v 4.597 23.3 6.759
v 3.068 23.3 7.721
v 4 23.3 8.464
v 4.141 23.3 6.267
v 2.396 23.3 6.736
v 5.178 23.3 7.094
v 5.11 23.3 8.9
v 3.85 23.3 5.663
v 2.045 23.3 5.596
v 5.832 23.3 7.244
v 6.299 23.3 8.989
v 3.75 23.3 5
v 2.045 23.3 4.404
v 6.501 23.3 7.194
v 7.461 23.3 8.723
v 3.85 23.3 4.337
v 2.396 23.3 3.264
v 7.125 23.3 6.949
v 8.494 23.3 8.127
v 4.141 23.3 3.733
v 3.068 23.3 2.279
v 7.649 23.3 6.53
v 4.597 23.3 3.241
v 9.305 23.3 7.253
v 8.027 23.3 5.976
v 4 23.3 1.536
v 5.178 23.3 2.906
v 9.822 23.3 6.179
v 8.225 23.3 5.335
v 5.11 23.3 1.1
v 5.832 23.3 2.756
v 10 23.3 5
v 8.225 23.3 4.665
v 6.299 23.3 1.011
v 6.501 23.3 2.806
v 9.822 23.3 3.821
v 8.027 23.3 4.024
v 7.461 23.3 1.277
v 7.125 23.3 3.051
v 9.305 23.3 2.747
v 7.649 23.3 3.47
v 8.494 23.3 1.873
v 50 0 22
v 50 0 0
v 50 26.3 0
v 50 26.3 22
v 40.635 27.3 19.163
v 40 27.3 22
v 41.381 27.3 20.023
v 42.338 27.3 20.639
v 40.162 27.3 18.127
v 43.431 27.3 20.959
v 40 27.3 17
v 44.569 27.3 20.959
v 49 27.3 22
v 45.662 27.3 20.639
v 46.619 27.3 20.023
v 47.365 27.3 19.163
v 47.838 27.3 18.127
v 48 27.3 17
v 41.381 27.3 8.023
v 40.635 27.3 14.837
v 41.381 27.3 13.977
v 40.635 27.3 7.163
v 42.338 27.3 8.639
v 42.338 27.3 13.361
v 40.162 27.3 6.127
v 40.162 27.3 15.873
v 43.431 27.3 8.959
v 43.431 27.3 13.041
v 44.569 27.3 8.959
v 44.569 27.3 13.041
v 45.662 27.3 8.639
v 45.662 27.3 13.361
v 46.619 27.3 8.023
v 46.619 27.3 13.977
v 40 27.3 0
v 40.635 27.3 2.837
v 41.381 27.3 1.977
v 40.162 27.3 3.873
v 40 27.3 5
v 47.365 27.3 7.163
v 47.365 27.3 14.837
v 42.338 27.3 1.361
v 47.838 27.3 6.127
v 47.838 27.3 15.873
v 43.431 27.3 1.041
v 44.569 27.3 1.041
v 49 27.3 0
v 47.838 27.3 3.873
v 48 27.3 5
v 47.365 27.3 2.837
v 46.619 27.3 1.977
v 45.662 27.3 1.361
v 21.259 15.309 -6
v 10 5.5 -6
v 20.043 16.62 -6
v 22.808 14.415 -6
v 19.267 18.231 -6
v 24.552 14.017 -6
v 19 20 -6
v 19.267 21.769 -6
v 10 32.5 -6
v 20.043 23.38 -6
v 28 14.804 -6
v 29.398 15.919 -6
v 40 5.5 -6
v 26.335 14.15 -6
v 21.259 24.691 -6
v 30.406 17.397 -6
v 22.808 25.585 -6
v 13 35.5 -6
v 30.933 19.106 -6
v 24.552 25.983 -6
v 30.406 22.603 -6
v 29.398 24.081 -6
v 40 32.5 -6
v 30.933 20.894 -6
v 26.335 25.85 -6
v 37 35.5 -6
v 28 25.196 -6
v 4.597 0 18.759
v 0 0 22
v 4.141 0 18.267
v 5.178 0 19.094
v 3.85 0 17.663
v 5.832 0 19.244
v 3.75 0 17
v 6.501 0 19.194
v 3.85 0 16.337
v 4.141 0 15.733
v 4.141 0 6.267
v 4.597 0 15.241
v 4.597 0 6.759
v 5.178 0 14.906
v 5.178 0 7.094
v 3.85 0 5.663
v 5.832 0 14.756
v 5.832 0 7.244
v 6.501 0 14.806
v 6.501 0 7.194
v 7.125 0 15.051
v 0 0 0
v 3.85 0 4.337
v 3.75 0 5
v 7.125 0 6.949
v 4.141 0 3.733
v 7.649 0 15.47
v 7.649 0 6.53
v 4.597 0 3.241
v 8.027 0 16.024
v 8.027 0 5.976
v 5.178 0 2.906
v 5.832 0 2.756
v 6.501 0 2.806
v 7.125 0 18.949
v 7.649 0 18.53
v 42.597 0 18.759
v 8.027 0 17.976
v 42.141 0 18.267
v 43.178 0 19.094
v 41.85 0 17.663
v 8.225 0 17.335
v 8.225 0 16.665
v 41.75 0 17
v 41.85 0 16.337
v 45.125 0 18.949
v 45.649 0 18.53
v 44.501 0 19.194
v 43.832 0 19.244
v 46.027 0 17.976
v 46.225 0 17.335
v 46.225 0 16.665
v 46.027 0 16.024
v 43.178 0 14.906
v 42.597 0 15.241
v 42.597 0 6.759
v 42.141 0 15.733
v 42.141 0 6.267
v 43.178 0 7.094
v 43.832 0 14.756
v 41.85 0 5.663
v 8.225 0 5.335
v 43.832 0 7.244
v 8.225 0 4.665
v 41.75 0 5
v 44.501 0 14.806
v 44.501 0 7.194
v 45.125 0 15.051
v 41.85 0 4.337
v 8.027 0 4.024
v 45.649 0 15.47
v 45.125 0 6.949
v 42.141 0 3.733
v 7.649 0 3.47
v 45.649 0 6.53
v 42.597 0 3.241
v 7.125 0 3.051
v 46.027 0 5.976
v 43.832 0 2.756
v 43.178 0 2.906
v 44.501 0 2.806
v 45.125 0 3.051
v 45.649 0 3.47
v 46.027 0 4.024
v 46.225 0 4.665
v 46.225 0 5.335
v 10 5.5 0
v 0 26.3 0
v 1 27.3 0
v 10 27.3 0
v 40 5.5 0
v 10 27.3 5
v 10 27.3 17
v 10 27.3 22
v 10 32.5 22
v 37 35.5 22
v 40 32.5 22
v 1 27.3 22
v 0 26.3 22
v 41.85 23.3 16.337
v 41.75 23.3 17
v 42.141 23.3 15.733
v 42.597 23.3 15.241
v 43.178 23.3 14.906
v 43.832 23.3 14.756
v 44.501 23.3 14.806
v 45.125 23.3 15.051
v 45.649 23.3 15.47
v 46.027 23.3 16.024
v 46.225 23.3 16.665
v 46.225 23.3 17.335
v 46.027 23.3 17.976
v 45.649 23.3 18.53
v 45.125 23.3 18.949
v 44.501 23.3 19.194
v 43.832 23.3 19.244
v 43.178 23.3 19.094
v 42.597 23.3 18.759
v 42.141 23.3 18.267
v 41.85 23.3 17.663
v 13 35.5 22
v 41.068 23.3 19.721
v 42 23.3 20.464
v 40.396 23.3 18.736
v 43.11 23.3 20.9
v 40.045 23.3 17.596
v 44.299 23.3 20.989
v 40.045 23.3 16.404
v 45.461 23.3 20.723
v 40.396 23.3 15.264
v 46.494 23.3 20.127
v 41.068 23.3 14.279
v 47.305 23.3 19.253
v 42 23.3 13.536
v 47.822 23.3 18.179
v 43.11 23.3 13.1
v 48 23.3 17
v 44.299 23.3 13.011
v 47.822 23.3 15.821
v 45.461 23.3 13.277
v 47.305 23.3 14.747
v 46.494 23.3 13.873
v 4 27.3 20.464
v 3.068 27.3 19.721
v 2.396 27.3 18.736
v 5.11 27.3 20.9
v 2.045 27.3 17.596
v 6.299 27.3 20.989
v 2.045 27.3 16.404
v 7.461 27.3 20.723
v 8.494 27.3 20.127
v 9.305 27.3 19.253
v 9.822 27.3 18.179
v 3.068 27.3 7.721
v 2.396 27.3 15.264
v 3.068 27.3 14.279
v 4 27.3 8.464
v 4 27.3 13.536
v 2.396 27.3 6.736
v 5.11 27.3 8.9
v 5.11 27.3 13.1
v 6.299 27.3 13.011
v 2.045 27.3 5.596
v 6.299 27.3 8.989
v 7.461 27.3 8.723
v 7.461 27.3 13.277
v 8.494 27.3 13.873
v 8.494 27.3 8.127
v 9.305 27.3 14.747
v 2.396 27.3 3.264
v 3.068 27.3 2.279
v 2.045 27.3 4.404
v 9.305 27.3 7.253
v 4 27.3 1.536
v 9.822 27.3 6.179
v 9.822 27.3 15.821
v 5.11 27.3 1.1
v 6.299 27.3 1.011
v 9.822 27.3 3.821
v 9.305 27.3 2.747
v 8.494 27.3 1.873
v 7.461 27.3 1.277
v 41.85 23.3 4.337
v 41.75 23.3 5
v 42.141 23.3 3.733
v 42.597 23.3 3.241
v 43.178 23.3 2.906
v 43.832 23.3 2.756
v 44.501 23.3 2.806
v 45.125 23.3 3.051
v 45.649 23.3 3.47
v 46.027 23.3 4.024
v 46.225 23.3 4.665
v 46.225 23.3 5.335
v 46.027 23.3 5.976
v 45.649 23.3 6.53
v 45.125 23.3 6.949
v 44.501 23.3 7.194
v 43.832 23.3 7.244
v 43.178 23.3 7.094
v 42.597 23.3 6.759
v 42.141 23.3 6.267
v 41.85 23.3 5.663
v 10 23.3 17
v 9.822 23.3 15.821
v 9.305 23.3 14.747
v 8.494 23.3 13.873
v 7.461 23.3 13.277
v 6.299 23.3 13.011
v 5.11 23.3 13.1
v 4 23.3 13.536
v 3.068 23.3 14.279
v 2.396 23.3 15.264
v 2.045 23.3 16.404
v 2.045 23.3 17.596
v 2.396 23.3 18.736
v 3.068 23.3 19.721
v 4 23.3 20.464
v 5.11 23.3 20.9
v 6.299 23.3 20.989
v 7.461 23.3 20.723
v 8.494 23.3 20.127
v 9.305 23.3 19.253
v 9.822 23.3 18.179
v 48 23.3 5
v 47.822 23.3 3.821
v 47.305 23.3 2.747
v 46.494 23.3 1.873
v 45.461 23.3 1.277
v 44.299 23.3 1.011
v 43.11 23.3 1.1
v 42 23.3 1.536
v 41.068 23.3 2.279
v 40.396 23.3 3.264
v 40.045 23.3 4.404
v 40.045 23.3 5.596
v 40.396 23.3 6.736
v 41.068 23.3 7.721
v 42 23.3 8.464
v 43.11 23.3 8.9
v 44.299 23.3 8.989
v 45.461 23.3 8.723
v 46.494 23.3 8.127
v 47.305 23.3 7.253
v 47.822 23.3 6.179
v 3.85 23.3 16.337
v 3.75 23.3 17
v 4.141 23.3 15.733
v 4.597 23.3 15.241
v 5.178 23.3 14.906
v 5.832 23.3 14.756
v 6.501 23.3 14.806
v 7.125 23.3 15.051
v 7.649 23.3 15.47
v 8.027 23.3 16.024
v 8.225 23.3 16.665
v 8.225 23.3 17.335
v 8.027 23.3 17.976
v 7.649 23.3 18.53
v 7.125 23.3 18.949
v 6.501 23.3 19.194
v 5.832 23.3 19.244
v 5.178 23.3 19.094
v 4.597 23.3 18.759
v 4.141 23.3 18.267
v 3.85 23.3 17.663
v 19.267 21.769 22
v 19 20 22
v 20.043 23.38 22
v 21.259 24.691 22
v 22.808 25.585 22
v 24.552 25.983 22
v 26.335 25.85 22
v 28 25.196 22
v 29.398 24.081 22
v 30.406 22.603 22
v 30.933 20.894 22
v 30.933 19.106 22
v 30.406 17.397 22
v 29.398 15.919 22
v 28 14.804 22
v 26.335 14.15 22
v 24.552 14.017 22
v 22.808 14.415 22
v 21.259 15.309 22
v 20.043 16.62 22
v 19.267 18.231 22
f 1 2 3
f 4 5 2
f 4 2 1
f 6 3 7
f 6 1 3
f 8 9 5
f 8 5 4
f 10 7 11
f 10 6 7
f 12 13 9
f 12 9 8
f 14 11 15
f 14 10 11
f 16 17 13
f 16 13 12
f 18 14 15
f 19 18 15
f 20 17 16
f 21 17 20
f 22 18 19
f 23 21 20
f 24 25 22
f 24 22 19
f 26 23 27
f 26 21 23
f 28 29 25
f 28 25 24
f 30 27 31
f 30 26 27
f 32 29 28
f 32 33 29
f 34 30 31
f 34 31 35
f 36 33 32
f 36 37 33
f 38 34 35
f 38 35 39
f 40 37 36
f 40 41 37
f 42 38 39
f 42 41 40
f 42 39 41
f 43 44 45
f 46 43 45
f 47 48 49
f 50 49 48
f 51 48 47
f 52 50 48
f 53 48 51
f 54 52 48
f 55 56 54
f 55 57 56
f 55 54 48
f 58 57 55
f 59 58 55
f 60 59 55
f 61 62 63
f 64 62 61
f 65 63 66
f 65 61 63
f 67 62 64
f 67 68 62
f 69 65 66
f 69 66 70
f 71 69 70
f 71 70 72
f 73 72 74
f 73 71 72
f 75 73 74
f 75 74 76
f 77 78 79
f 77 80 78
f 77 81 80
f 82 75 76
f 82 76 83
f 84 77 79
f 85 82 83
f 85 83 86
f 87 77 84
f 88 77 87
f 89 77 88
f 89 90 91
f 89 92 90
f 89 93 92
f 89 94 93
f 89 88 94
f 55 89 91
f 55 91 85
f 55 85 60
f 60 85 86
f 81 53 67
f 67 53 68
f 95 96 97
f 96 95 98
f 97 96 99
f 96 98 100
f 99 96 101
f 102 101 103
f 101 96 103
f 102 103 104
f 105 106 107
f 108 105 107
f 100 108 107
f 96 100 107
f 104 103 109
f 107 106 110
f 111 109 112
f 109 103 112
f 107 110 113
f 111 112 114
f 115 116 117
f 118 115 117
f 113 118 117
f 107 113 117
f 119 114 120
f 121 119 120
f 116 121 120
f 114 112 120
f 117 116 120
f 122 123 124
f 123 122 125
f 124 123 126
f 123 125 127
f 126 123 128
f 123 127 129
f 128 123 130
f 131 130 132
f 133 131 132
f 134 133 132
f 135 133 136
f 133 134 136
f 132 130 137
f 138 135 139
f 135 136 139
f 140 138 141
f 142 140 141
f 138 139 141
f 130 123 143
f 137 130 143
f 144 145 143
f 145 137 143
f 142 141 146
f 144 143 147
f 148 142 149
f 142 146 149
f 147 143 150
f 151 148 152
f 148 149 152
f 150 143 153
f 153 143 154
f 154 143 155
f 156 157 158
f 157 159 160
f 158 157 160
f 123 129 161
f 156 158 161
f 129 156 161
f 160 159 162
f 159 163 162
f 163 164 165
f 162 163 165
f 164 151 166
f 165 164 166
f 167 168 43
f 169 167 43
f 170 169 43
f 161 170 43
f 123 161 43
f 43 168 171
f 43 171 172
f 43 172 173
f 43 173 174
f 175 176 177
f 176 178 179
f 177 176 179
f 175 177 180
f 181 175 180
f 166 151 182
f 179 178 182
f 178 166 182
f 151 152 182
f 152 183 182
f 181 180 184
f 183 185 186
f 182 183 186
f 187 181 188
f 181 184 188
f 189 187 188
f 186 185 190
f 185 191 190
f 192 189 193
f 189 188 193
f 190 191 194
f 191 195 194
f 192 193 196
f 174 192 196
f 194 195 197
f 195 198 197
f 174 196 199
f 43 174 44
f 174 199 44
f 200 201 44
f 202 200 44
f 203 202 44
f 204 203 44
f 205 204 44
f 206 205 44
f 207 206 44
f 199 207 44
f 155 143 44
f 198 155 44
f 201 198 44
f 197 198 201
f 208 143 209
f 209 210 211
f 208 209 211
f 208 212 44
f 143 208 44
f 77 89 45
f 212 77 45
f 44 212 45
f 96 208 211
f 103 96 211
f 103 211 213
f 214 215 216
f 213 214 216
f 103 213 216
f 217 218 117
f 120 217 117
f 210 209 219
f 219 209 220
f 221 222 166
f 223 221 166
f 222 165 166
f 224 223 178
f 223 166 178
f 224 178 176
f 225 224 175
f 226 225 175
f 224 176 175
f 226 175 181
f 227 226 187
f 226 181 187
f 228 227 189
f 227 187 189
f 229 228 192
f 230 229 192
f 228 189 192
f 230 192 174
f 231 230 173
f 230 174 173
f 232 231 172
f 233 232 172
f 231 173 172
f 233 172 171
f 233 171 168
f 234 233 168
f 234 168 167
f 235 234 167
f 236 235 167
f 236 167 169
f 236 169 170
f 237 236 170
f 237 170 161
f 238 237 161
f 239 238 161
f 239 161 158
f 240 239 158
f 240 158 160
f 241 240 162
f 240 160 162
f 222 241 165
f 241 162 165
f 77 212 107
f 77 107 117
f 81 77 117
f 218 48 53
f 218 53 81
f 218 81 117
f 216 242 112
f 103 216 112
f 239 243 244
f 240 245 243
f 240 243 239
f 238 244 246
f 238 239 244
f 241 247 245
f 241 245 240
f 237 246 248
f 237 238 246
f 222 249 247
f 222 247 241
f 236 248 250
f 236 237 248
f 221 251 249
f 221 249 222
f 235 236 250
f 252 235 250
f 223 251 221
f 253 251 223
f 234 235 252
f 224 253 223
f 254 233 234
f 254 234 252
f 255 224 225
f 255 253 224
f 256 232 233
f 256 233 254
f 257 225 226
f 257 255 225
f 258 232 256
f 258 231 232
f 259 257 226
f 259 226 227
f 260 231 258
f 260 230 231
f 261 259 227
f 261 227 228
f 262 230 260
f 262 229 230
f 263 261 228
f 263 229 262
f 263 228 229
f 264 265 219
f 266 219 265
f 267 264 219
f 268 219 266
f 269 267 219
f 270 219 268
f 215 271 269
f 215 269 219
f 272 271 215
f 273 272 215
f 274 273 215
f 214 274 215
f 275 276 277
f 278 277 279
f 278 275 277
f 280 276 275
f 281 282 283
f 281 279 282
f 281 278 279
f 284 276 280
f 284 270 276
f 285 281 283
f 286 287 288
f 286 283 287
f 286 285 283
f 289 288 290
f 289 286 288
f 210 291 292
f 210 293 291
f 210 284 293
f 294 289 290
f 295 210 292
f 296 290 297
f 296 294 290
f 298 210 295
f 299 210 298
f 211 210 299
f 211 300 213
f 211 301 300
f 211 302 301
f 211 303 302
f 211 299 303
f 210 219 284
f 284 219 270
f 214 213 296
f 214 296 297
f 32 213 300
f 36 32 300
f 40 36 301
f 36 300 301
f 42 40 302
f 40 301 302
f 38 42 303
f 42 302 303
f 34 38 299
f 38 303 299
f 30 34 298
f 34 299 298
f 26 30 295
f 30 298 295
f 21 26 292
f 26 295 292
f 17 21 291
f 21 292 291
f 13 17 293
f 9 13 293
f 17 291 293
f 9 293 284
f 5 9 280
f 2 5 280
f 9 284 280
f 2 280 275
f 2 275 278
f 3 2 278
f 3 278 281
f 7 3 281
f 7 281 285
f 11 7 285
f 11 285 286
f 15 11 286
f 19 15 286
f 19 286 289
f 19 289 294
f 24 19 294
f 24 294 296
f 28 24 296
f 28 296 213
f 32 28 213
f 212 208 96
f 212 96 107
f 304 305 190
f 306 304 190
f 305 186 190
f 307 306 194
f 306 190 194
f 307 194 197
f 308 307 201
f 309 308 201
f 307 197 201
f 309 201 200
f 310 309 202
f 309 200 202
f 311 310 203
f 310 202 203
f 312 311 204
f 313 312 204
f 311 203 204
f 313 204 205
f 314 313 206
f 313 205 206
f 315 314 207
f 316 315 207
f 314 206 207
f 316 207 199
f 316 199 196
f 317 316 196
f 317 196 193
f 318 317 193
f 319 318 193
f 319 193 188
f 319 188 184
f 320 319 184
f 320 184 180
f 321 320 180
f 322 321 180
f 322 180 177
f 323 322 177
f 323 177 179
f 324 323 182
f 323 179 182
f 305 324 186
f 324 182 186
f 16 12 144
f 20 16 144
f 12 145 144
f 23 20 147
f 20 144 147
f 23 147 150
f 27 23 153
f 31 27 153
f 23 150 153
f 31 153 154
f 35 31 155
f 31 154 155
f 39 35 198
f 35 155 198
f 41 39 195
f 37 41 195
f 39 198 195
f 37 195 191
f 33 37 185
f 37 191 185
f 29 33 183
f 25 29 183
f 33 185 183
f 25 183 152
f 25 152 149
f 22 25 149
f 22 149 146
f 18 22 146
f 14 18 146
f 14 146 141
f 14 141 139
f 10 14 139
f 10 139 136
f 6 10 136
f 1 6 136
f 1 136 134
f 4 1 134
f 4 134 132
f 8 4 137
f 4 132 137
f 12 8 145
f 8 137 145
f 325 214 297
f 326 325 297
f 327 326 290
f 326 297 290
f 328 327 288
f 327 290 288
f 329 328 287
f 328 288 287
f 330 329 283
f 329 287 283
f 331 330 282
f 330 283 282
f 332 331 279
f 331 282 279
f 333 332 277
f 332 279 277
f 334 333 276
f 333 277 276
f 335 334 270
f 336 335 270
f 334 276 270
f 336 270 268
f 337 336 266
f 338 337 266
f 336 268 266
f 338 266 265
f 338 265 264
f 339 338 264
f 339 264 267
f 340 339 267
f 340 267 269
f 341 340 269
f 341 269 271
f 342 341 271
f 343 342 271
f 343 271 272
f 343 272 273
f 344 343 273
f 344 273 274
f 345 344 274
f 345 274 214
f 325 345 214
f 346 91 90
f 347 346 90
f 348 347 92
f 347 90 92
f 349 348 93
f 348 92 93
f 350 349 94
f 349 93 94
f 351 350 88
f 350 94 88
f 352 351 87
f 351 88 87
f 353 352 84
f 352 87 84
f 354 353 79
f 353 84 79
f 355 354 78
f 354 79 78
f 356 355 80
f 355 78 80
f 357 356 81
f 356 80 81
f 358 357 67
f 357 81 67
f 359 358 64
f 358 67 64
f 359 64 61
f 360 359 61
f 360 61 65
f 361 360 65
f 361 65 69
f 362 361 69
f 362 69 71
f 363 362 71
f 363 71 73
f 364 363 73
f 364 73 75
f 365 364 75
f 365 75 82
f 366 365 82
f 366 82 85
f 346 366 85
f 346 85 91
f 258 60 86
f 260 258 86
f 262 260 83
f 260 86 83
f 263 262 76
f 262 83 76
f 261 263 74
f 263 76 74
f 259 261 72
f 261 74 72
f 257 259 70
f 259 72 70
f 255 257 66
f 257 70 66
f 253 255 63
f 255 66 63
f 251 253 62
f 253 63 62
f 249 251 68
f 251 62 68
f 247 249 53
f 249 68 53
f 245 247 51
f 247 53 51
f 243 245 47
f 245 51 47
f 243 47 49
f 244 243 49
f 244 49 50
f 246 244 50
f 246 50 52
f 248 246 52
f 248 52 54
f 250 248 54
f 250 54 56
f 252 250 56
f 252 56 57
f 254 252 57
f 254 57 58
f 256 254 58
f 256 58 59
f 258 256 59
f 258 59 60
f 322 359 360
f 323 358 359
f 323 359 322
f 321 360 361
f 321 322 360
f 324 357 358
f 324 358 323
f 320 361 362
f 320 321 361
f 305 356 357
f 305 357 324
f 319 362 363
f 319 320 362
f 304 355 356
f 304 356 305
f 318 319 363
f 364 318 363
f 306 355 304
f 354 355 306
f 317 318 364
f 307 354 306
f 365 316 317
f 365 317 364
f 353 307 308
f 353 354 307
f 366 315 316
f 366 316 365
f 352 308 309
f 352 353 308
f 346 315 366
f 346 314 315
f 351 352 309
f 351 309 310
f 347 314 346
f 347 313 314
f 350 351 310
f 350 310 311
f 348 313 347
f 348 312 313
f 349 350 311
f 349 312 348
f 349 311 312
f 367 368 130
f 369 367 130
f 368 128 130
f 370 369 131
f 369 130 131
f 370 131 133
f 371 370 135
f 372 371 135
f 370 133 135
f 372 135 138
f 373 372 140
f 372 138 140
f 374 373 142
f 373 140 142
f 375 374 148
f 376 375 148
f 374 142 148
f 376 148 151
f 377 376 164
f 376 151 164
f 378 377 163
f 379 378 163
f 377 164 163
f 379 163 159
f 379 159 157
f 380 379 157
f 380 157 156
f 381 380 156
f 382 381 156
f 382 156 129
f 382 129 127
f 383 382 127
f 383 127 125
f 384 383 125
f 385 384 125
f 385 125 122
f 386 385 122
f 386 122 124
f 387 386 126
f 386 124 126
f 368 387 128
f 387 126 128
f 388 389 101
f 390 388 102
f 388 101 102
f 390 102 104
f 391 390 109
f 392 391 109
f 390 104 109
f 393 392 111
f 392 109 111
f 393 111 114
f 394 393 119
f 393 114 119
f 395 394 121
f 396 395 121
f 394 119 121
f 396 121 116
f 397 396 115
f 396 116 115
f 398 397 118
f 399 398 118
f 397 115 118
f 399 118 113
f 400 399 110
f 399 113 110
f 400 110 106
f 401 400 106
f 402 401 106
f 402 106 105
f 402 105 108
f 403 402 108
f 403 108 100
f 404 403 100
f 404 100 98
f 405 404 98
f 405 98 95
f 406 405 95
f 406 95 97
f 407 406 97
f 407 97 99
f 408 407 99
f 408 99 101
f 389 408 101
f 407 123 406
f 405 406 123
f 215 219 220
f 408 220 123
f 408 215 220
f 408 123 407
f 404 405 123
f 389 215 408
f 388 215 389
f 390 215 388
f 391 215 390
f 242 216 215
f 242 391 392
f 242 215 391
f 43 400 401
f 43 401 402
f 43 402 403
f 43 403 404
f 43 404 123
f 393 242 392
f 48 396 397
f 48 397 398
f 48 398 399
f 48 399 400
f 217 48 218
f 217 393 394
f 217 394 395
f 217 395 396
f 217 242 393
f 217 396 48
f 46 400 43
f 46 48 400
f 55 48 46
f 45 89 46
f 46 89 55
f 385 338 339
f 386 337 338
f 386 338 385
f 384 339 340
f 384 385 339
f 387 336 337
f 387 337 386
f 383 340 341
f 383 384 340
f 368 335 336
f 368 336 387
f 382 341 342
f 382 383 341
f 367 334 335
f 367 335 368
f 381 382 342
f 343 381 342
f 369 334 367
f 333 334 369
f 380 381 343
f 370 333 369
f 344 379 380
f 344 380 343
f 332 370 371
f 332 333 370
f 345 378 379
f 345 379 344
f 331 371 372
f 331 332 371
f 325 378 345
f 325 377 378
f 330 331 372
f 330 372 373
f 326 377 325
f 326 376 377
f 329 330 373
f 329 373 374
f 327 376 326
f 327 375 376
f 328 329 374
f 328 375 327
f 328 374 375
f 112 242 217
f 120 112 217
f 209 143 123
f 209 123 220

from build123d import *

# Parameters (mm, degrees)
SKETCH_1_W                   = 50
SKETCH_1_H                   = 27.3
EXTRUDE_1_DEPTH              = 22
SKETCH_2_W                   = 30
SKETCH_2_H                   = 30
EXTRUDE_2_DEPTH              = 28
SKETCH_3_R                   = 6
CUT_EXTRUDE_1_DEPTH          = 68.411052506
CHAMFER_1_SIZE               = 3
CHAMFER_2_SIZE               = 1
HOLE_WIZARD_M4_1_D           = 4.5
HOLE_WIZARD_M4_1_CBORE_D     = 8
HOLE_WIZARD_M4_1_CBORE_DEPTH = 4


with BuildPart() as part:
    # 스케치1 → 보스-돌출1 (new body)
    with BuildSketch(Plane.XY):
        with Locations((25, 13.65)):
            Rectangle(SKETCH_1_W, SKETCH_1_H)
    extrude(amount=EXTRUDE_1_DEPTH)

    # 스케치2 → 보스-돌출2 (add)
    with BuildSketch(Plane.XY.offset(22)):
        with Locations((25, 20.5)):
            Rectangle(SKETCH_2_W, SKETCH_2_H)
    extrude(amount=-EXTRUDE_2_DEPTH)

    # 스케치3 → 컷-돌출1 (cut, through all)
    with BuildSketch(Plane(origin=(0, 0, -6), x_dir=(-1, 0, 0), z_dir=(0, 0, -1))):
        with Locations((-25, 20)):
            Circle(SKETCH_3_R)
    extrude(amount=-CUT_EXTRUDE_1_DEPTH, mode=Mode.SUBTRACT)

    # 모따기1
    chamfer_1_edges = [part.edges().sort_by_distance(p)[0] for p in [
        (40, 35.5, 8),
        (10, 35.5, 8),
    ]]
    chamfer(chamfer_1_edges, length=CHAMFER_1_SIZE)

    # 모따기2
    chamfer_2_edges = [part.edges().sort_by_distance(p)[0] for p in [
        (0, 27.3, 11),
        (50, 27.3, 11),
    ]]
    chamfer(chamfer_2_edges, length=CHAMFER_2_SIZE)

    # M4 소켓 머리 캡 나사용 카운터보어1 (through all)
    with Locations(Plane(origin=(0, 27.3, 0), x_dir=(1, 0, 0), z_dir=(0, 1, 0))):
        with Locations((44, -5), (44, -17), (6, -17), (6, -5)):
            CounterBoreHole(HOLE_WIZARD_M4_1_D / 2, HOLE_WIZARD_M4_1_CBORE_D / 2, HOLE_WIZARD_M4_1_CBORE_DEPTH)


solid = part.part
